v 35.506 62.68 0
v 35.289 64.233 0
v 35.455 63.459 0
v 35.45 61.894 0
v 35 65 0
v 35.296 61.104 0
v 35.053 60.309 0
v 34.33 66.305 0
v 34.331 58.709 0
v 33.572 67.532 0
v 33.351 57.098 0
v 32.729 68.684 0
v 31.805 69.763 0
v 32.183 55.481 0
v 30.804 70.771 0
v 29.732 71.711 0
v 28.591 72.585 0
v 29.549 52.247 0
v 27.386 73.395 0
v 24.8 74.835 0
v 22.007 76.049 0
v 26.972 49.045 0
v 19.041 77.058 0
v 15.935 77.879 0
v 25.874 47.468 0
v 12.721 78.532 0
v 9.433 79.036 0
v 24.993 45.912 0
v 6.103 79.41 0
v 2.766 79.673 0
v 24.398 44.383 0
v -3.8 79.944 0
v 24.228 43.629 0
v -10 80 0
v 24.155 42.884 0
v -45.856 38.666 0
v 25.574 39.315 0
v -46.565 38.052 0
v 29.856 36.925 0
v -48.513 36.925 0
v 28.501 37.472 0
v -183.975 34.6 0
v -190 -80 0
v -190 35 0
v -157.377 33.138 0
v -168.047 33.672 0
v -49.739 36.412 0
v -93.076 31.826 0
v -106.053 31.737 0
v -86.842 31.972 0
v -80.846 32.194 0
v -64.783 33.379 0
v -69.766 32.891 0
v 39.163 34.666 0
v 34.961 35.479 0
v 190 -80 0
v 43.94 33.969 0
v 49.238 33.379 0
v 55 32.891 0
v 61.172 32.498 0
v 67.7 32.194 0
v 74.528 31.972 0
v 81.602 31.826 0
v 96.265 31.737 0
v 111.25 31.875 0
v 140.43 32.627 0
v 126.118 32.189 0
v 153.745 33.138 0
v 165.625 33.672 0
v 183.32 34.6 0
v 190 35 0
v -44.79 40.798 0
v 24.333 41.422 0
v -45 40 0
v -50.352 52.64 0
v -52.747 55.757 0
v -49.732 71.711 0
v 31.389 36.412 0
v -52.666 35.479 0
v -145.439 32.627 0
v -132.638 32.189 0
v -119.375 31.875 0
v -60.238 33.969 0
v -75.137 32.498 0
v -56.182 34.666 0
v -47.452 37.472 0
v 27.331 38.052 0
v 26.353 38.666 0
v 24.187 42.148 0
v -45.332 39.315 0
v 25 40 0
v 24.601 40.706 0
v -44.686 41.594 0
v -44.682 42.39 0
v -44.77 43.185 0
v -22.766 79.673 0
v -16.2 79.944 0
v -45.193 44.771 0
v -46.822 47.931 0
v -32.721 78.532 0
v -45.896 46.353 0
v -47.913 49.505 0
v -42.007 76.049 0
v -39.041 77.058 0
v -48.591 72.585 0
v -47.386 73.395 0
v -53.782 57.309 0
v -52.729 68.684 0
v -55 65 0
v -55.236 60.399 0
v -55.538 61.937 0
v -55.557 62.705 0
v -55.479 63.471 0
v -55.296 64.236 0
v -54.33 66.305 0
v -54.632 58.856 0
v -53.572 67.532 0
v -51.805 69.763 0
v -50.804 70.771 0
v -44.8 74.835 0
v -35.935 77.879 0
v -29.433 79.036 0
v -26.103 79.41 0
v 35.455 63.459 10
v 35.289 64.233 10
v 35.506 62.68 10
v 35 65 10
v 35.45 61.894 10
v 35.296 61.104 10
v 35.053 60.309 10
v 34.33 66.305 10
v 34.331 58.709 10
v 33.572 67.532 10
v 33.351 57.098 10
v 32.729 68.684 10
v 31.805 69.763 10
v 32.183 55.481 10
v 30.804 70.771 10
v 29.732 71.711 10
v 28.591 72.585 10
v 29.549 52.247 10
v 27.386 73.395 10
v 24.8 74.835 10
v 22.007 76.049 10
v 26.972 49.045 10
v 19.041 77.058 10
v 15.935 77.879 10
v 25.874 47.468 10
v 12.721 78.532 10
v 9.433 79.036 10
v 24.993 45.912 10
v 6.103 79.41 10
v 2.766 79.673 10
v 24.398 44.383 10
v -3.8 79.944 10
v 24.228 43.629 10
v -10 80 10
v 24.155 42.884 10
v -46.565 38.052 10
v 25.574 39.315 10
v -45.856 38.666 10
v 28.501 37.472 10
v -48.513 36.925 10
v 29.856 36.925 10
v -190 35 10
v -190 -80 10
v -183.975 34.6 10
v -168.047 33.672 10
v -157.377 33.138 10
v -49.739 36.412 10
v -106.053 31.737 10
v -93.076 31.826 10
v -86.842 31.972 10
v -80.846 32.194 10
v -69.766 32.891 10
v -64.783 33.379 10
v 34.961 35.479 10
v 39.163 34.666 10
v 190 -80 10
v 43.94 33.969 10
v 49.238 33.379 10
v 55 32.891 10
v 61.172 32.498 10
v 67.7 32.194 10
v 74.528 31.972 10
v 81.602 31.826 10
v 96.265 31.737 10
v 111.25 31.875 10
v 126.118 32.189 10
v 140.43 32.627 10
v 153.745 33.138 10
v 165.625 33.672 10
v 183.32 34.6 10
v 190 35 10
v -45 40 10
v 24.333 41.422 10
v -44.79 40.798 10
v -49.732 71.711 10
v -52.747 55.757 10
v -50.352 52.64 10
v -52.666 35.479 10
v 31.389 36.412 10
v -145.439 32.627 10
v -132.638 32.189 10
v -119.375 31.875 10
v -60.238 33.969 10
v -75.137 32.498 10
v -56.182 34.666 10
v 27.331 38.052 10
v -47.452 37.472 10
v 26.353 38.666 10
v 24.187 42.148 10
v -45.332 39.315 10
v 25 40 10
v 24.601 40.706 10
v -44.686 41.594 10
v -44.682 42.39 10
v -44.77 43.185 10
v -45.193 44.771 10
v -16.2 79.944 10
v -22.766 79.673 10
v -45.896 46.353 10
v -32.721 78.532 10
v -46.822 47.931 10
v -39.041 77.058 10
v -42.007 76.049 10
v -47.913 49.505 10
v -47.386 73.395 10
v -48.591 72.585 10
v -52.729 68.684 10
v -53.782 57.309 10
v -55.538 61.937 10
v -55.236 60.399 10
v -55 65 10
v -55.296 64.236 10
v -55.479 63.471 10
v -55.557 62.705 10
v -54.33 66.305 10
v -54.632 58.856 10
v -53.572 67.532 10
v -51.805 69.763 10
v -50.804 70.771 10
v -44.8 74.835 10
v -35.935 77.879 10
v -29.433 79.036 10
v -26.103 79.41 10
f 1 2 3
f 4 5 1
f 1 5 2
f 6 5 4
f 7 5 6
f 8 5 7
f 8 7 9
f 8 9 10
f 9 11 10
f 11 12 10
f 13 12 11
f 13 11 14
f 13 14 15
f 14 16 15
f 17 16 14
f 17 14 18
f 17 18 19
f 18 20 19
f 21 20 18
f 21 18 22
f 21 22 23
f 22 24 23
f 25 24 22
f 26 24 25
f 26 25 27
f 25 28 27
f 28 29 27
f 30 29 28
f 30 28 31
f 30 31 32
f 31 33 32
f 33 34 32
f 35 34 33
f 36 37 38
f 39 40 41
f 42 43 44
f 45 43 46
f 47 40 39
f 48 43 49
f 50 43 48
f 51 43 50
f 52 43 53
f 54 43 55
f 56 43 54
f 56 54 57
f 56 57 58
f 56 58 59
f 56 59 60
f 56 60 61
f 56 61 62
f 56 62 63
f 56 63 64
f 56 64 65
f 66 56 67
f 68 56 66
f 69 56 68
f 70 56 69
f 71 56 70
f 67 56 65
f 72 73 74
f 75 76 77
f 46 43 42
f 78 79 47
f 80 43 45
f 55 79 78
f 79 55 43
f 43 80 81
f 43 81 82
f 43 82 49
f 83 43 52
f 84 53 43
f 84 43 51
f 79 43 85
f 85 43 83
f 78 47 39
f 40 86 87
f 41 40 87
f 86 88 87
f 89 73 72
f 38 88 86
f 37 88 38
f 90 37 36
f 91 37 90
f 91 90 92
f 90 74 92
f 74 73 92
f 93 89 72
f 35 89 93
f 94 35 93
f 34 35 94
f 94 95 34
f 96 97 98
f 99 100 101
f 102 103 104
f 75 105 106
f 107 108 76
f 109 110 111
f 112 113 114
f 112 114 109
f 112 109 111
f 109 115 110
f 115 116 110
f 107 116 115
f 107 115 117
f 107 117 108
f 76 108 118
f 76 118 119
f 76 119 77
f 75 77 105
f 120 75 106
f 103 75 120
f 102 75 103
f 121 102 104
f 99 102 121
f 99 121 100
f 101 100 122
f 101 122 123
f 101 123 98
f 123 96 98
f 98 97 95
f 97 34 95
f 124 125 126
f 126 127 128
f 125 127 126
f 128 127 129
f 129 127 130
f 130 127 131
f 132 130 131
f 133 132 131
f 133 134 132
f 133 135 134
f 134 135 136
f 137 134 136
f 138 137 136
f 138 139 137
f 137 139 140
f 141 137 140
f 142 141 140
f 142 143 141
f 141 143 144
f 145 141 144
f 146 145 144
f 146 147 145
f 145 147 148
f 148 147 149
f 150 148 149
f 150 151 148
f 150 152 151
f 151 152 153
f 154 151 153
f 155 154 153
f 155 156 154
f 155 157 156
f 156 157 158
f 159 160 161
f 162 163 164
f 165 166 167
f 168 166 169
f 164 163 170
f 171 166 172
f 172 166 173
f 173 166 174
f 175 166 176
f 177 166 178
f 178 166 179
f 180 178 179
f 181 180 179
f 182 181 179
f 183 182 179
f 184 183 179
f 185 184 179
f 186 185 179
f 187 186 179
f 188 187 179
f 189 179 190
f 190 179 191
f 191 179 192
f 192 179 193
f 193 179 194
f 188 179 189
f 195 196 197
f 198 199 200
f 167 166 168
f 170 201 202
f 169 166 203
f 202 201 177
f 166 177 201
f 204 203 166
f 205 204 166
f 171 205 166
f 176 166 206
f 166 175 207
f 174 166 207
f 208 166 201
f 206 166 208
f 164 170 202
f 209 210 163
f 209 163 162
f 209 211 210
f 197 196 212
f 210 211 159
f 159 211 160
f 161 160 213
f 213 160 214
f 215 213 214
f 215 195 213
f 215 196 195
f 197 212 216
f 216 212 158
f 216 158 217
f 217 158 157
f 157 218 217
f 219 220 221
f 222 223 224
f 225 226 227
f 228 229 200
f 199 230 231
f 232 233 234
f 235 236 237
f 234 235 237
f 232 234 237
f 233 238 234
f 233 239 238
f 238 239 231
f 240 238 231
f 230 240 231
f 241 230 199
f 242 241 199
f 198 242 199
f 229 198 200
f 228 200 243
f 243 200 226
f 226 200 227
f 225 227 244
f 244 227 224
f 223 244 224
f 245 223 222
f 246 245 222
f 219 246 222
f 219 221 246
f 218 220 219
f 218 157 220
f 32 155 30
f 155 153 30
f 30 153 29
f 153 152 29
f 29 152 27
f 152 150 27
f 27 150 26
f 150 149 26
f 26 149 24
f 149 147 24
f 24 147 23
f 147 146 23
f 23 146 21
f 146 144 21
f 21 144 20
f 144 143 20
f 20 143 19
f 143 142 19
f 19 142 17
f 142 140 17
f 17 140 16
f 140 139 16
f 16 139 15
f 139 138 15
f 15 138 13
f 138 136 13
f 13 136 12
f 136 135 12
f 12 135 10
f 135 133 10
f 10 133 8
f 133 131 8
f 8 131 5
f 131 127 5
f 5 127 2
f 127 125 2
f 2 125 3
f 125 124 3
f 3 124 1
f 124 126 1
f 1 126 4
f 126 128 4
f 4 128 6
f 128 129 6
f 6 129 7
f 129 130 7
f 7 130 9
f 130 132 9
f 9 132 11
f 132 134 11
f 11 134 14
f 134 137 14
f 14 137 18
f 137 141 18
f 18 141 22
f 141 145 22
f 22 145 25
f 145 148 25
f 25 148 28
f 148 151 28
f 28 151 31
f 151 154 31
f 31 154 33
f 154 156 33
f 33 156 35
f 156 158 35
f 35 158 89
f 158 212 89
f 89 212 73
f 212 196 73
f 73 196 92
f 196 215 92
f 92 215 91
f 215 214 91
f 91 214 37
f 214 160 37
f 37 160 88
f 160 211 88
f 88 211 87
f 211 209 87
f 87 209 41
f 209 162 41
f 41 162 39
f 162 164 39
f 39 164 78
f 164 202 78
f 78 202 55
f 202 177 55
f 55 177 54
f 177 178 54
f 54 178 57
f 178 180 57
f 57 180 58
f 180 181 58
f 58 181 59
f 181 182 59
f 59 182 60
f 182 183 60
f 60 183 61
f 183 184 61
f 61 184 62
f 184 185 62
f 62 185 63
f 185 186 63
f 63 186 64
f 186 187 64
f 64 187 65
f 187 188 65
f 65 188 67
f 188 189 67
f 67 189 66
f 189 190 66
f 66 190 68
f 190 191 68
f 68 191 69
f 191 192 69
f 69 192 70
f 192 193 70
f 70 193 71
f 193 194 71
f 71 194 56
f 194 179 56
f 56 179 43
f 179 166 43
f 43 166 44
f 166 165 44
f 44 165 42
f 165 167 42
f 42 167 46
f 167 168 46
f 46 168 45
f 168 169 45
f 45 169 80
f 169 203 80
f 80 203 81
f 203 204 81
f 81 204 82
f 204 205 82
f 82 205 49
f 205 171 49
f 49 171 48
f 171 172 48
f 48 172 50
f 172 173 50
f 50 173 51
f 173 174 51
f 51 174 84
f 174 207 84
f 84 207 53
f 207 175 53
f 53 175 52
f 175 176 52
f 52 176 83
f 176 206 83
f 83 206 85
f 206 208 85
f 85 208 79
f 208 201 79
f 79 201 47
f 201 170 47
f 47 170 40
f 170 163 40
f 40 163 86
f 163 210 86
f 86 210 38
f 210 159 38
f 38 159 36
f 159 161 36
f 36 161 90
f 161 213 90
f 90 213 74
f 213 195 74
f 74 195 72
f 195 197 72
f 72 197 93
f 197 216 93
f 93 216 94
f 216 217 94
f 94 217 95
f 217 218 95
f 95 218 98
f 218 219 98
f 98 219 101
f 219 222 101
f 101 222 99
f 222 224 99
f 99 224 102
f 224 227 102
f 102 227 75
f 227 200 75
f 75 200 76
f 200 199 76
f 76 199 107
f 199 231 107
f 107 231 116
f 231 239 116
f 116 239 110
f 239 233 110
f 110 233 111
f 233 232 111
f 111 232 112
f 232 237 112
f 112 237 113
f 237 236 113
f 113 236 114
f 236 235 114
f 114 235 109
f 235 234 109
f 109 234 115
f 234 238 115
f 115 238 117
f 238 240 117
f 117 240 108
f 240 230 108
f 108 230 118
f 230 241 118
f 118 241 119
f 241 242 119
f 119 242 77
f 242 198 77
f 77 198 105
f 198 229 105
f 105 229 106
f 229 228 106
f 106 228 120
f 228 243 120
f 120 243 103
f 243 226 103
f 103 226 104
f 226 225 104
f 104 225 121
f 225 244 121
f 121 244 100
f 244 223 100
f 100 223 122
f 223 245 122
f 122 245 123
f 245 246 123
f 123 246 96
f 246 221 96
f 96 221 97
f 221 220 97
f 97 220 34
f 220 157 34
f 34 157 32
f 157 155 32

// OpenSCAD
// Module names are of the form poly_<inkscape-path-id>().  As a result,
// you can associate a polygon in this OpenSCAD program with the corresponding
// SVG element in the Inkscape document by looking for the XML element with
// the attribute id="inkscape-path-id".

// fudge value is used to ensure that subtracted solids are a tad taller
// in the z dimension than the polygon being subtracted from.  This helps
// keep the resulting .stl file manifold.
fudge = 0.1;

module poly_path2995(h)
{
  scale([25.4/90, -25.4/90, 1]) union()
  {
    linear_extrude(height=h)
      polygon([[-673.228345,-124.015748],[-673.228345,283.464565],[673.228345,283.464565],[673.228345,-124.015748],[649.560161,-122.597041],[586.860235,-119.309793],[544.766161,-117.419626],[497.585505,-115.607314],[446.875382,-114.054522],[394.192911,-112.942913],[341.095209,-112.454151],[289.139392,-112.769900],[264.076291,-113.286236],[239.882579,-114.071823],[216.752898,-115.149370],[194.881887,-116.541584],[174.464186,-118.271174],[155.694433,-120.360847],[138.767270,-122.833312],[123.877335,-125.711275],[111.219269,-129.017446],[105.788011,-130.838206],[100.987710,-132.774533],[96.842696,-134.829265],[93.377299,-137.005242],[90.615849,-139.305302],[88.582675,-141.732283],[87.170233,-144.232611],[86.220519,-146.770787],[85.703516,-149.344756],[85.589209,-151.952460],[85.847580,-154.591842],[86.448613,-157.260847],[88.558600,-162.679498],[91.679036,-168.191958],[95.569791,-173.781775],[104.701725,-185.127668],[114.033345,-196.585556],[118.173706,-202.315365],[121.643593,-208.023815],[124.202872,-213.694452],[125.065993,-216.510450],[125.611412,-219.310824],[125.809113,-222.093519],[125.629080,-224.856478],[125.041296,-227.597643],[124.015745,-230.314960],[121.643410,-234.939057],[118.955979,-239.287436],[115.968121,-243.368550],[112.694502,-247.190855],[109.149791,-250.762805],[105.348657,-254.092855],[101.305767,-257.189459],[97.035789,-260.061073],[87.873242,-265.163145],[77.978361,-269.466709],[67.468490,-273.039403],[56.460974,-275.948862],[45.073156,-278.262724],[33.422381,-280.048627],[21.625994,-281.374207],[9.801339,-282.307101],[-13.463398,-283.265382],[-35.433075,-283.464565],[-57.402749,-283.265382],[-80.667484,-282.307101],[-92.492139,-281.374207],[-104.288525,-280.048627],[-115.939299,-278.262724],[-127.327117,-275.948862],[-138.334634,-273.039403],[-148.844505,-269.466709],[-158.739386,-265.163145],[-167.901933,-260.061073],[-172.171911,-257.189459],[-176.214801,-254.092855],[-180.015936,-250.762805],[-183.560646,-247.190855],[-186.834265,-243.368550],[-189.822124,-239.287436],[-192.509555,-234.939057],[-194.881890,-230.314960],[-195.928965,-227.608171],[-196.578544,-224.897228],[-196.856477,-222.182151],[-196.788615,-219.462958],[-195.718907,-214.012305],[-193.576225,-208.545419],[-190.567374,-203.062454],[-186.899156,-197.563562],[-178.411842,-186.518611],[-169.768717,-175.411786],[-165.905736,-169.835552],[-162.624215,-164.244308],[-160.130959,-158.638207],[-158.632771,-153.017400],[-158.321454,-150.201530],[-158.336456,-147.382041],[-158.703628,-144.558953],[-159.448819,-141.732283],[-160.625916,-139.305302],[-162.481413,-137.005242],[-164.993008,-134.829265],[-168.138399,-132.774533],[-171.895282,-130.838206],[-176.241357,-129.017446],[-186.611866,-125.711275],[-199.071509,-122.833312],[-213.441864,-120.360847],[-229.544512,-118.271174],[-247.201033,-116.541584],[-266.233008,-115.149370],[-286.462017,-114.071823],[-307.709641,-113.286236],[-329.797459,-112.769900],[-375.780000,-112.454151],[-422.982283,-112.942913],[-469.976950,-114.054522],[-515.336644,-115.607314],[-557.634007,-117.419626],[-595.441682,-119.309793],[-651.878536,-122.597041],[-673.228345,-124.015748]]);
  }
}

poly_path2995(10);
